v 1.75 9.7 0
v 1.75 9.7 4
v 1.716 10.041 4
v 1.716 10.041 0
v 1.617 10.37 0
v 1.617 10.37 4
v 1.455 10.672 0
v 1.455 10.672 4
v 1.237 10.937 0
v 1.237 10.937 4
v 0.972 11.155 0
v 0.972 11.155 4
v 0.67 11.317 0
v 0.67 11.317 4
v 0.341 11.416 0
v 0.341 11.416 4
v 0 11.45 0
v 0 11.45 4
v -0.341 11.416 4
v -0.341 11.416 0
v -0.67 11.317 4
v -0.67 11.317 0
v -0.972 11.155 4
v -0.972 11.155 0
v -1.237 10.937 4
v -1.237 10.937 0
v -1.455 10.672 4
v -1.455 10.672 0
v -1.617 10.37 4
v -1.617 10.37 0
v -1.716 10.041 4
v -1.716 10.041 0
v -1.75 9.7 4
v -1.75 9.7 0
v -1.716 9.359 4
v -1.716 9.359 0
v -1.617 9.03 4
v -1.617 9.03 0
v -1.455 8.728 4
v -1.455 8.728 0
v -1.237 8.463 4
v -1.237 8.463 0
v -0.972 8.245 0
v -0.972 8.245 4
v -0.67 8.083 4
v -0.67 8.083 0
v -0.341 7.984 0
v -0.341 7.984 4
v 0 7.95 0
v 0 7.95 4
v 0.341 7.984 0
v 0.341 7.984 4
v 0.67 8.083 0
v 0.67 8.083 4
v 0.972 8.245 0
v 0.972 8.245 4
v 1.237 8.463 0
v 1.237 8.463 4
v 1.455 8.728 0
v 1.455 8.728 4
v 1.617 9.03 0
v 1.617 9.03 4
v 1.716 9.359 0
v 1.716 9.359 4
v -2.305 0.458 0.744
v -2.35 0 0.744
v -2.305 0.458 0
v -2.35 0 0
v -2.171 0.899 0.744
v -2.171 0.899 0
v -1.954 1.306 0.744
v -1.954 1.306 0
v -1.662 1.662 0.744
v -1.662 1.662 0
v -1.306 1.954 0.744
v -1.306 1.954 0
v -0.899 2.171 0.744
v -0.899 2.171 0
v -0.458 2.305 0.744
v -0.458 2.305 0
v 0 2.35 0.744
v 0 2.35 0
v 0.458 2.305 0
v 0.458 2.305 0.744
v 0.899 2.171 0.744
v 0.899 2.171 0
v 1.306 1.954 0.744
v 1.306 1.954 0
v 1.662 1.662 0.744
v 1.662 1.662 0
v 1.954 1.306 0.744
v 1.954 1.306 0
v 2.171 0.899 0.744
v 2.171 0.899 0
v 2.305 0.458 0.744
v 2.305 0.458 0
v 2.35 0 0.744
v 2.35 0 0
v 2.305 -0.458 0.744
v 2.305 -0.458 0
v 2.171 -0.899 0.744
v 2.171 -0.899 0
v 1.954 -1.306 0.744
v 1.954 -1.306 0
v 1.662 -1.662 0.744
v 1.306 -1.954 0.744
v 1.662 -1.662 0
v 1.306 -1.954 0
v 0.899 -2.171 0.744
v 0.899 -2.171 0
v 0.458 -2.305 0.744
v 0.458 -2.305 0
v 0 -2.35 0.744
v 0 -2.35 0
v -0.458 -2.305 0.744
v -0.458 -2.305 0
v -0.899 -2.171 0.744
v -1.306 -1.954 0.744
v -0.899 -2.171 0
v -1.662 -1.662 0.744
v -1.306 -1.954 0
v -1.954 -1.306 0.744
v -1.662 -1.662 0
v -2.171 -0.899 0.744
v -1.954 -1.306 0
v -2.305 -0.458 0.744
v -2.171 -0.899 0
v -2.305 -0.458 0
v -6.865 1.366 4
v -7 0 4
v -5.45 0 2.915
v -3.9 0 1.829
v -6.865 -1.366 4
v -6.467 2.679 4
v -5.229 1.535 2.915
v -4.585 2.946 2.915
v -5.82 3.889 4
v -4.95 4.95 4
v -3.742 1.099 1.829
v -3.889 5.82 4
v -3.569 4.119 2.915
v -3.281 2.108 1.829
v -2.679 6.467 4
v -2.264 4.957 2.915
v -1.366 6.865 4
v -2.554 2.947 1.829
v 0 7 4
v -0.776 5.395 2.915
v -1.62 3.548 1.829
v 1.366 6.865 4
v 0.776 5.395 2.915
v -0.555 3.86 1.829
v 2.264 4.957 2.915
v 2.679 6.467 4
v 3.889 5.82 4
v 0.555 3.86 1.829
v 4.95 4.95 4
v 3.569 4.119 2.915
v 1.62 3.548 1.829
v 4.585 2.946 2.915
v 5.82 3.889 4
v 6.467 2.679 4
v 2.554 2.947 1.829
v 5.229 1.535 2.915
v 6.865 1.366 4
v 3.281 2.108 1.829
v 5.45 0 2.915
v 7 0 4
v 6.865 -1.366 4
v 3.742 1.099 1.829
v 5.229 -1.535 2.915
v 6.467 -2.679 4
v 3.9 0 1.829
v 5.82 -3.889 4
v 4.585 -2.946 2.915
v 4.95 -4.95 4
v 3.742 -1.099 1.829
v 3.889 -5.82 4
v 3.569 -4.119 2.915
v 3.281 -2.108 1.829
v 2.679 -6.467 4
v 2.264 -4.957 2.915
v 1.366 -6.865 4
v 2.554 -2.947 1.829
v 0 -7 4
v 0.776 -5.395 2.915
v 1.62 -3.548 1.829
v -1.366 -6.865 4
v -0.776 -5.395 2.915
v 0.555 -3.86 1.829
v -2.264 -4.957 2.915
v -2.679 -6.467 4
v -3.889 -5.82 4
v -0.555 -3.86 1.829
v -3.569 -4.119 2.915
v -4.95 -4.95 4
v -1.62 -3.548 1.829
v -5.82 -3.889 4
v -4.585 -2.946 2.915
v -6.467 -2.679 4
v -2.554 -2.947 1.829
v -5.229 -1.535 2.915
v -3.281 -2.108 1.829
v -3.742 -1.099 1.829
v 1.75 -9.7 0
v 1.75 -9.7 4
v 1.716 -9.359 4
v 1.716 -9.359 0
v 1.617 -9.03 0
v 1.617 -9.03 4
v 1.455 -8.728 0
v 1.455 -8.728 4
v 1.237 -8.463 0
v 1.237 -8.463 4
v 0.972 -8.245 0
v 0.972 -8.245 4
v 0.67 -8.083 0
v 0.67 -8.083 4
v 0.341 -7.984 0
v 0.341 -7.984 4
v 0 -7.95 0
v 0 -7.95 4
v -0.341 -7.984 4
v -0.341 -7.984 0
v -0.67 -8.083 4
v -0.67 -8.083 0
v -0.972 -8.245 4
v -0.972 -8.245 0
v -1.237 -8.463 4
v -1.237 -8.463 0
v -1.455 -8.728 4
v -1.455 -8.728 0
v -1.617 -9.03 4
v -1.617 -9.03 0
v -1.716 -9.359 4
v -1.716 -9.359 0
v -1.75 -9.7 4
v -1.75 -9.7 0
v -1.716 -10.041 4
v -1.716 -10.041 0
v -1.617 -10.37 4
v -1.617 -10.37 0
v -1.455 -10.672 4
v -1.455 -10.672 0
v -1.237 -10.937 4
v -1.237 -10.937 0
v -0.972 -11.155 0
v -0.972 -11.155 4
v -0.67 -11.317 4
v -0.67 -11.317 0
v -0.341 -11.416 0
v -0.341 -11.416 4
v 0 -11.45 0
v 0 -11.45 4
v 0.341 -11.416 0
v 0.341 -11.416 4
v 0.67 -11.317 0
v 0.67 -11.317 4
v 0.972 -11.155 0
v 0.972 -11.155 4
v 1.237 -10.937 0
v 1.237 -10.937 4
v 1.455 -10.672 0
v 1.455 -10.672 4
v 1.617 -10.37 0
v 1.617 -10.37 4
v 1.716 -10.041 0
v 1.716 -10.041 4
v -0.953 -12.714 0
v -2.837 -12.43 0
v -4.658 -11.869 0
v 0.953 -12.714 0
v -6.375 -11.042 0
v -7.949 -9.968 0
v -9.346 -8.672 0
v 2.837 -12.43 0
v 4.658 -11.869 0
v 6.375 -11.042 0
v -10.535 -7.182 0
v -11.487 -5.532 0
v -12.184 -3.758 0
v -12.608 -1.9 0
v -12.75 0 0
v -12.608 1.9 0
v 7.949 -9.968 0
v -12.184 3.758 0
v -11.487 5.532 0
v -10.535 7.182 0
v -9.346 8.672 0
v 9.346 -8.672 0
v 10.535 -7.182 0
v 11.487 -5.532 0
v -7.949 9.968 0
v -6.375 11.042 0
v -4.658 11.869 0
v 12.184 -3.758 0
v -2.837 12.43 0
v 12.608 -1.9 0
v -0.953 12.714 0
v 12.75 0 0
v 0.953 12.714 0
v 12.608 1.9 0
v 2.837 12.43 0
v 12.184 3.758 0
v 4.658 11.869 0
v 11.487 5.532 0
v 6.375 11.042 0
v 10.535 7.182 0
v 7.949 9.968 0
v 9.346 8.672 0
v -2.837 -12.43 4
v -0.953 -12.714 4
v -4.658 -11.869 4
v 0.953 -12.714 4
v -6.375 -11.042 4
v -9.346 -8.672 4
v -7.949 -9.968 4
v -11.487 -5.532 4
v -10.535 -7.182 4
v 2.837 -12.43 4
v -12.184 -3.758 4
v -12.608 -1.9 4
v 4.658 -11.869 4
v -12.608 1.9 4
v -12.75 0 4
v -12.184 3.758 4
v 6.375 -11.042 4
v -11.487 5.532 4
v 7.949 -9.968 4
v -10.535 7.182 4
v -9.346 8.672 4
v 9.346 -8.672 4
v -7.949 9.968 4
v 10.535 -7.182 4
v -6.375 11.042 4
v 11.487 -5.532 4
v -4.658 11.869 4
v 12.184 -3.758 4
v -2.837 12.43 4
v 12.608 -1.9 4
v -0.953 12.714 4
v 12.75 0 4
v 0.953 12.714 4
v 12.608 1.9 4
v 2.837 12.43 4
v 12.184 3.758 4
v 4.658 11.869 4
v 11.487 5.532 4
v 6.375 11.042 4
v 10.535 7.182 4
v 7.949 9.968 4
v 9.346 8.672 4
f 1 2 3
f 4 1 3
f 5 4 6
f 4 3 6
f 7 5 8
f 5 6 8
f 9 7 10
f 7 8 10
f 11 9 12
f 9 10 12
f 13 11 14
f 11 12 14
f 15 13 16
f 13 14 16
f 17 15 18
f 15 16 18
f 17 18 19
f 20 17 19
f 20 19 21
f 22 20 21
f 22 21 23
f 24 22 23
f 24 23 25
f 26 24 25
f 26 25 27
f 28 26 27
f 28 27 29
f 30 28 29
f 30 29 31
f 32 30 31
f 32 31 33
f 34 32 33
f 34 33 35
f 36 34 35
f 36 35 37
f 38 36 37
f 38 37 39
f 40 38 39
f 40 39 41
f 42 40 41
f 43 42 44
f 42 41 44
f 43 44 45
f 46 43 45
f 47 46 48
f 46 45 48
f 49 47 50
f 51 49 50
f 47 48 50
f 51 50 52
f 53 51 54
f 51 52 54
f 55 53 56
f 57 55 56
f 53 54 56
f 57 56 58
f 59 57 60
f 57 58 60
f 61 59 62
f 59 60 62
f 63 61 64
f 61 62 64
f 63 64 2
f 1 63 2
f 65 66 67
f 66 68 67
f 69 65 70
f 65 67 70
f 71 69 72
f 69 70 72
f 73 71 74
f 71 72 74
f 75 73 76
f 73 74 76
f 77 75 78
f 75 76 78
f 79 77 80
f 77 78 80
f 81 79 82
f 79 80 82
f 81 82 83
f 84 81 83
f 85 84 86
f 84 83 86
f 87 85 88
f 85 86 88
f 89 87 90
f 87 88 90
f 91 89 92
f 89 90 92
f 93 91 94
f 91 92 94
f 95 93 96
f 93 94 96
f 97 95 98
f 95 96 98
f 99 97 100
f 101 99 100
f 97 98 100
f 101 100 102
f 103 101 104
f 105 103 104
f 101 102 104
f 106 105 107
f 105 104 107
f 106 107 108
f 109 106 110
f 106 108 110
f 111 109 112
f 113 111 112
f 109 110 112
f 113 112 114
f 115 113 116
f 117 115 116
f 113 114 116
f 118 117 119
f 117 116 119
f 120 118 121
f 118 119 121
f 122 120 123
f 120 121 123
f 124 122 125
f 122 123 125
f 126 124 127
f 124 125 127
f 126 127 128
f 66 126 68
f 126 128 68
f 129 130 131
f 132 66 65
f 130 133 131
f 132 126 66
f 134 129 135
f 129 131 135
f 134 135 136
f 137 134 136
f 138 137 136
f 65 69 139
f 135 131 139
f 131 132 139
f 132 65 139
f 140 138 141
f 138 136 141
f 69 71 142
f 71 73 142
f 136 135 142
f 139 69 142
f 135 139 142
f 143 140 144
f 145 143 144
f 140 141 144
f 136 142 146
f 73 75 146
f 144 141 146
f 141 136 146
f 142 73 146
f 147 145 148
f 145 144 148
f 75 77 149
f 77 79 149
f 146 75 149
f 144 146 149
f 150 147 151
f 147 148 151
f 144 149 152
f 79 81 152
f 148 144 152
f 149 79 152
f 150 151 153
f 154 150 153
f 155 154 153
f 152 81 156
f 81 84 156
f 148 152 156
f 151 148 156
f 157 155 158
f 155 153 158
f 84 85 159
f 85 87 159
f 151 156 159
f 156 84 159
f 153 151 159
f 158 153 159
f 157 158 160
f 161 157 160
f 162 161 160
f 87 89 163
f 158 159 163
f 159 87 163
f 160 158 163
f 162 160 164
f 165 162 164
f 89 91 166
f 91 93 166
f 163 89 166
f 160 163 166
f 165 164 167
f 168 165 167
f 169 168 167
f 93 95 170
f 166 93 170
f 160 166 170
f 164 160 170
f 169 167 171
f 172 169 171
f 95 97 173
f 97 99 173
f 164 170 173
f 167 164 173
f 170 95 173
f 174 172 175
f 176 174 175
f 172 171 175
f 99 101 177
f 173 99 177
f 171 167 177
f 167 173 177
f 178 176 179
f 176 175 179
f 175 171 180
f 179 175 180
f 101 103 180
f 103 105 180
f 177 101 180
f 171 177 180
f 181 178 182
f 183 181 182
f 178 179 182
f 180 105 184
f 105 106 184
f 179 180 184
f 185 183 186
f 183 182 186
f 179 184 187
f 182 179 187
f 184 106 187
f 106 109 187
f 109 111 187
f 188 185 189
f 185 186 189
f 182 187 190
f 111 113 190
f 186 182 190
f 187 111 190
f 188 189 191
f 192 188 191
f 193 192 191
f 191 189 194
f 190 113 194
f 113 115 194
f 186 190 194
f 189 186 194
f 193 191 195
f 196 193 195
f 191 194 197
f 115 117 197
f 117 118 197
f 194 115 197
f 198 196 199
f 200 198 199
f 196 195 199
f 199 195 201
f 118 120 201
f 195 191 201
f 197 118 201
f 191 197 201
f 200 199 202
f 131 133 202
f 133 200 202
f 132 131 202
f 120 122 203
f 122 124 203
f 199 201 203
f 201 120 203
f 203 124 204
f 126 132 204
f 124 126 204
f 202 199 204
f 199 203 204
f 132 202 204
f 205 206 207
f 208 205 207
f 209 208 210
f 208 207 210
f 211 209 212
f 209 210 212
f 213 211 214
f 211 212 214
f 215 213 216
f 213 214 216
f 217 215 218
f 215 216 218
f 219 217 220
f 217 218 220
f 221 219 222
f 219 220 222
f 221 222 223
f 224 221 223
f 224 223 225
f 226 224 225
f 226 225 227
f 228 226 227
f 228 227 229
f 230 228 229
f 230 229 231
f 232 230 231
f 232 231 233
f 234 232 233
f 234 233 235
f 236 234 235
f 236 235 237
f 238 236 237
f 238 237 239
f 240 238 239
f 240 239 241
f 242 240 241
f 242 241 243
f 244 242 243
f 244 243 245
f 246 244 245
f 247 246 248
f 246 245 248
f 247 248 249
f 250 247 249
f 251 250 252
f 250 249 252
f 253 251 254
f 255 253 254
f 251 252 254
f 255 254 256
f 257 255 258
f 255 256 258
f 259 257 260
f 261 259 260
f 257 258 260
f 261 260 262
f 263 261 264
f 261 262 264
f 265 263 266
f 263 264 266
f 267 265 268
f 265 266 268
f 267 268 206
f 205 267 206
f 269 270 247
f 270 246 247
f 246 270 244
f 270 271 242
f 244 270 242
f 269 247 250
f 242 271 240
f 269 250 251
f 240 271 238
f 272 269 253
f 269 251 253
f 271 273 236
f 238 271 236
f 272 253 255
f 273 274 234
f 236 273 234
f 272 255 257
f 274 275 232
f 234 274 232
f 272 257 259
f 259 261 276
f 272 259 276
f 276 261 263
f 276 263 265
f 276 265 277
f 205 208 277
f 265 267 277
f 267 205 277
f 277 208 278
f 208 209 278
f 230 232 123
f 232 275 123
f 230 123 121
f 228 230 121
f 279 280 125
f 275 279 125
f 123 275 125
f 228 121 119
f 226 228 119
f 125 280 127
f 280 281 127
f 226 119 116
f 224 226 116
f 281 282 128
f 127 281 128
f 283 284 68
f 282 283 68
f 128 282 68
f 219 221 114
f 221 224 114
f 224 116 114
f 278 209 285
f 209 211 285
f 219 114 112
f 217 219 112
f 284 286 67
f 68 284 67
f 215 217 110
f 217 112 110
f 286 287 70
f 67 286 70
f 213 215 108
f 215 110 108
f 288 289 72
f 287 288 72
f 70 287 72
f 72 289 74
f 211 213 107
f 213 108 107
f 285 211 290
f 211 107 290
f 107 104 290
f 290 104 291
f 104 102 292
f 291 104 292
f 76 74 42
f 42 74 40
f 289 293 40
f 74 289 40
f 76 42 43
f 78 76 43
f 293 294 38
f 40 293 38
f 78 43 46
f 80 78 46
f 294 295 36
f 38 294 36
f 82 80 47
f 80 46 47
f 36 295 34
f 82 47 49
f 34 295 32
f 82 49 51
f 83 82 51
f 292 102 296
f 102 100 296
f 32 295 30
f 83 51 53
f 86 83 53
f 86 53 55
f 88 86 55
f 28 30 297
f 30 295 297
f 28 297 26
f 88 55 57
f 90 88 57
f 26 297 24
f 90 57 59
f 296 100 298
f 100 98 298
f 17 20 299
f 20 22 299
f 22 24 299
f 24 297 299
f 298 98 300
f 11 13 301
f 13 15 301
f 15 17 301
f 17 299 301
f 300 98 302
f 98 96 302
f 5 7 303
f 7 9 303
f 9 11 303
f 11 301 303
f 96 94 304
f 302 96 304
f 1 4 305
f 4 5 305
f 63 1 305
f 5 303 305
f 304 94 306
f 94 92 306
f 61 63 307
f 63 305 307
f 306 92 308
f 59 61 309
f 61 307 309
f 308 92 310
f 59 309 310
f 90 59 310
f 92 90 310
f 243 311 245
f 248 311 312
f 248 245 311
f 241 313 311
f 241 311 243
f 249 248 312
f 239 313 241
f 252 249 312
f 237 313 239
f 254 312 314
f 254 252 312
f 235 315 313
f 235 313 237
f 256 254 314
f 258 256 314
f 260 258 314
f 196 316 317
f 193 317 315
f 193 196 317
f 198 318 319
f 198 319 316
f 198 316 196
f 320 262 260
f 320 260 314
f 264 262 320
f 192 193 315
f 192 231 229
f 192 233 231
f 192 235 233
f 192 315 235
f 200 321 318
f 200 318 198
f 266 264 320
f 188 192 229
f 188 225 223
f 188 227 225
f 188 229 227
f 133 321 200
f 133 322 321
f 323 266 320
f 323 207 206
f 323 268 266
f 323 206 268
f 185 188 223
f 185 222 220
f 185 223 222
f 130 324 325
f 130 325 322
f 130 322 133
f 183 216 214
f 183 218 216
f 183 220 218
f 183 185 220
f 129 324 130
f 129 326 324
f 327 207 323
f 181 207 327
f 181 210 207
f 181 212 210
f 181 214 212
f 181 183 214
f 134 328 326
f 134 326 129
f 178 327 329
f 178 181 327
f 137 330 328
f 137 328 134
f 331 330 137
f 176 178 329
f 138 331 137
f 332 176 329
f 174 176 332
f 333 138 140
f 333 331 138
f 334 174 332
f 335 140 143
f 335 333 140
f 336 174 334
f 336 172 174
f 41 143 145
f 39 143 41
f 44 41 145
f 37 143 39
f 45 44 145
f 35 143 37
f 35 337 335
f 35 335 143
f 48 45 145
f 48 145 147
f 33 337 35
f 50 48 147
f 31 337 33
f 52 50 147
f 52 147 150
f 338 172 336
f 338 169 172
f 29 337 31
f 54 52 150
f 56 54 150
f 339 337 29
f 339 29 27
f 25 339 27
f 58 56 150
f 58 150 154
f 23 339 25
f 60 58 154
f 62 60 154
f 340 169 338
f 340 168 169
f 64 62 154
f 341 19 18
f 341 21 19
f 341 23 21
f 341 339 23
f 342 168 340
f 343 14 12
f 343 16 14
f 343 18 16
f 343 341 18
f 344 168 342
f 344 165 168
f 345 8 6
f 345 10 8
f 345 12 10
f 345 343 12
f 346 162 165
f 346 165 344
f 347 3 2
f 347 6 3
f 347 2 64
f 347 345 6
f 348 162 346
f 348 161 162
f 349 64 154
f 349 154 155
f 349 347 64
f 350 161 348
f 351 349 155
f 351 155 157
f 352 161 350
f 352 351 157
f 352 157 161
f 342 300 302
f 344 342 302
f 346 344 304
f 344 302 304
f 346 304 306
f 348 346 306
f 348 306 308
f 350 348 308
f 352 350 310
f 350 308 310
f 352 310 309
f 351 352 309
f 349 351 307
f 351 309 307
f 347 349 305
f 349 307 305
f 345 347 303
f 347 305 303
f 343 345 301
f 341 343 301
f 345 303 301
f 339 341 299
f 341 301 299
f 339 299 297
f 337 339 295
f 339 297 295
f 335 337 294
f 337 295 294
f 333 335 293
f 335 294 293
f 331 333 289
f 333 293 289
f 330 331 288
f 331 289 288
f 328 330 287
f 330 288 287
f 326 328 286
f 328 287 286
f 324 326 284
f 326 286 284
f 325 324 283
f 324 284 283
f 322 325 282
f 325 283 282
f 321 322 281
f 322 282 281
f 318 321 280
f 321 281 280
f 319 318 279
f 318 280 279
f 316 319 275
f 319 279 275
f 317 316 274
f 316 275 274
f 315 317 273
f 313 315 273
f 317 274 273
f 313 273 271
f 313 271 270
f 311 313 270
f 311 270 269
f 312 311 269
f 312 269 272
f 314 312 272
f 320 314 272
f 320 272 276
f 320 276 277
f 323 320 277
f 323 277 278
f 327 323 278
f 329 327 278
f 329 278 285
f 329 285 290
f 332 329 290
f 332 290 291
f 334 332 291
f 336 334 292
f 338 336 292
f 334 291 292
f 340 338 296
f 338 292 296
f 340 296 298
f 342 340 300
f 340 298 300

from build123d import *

# Parameters (mm, degrees)
F0_R           = 12.75
F1_DEPTH       = 4
F3_D           = 4.7
F3_CSINK_D     = 14
F3_CSINK_ANGLE = 110
F4_R           = 1.75
F5_DEPTH       = 4.001


with BuildPart() as f1:
    # F0 (on Top) → F1 (new body)
    with BuildSketch(Plane.XY):
        Circle(F0_R)
    extrude(amount=F1_DEPTH)

    # F3 (through all)
    with Locations(Plane.XY.offset(4)):
        with Locations((0, 0)):
            CounterSinkHole(F3_D / 2, F3_CSINK_D / 2, counter_sink_angle=F3_CSINK_ANGLE)

    # F4 (on face) → F5 (cut, through all)
    with BuildSketch(Plane.XY.offset(4)):
        with Locations((0, -9.7)):
            Circle(F4_R)
        with Locations((0, 9.7)):
            Circle(F4_R)
    extrude(amount=-F5_DEPTH, mode=Mode.SUBTRACT)


solid = f1.part
